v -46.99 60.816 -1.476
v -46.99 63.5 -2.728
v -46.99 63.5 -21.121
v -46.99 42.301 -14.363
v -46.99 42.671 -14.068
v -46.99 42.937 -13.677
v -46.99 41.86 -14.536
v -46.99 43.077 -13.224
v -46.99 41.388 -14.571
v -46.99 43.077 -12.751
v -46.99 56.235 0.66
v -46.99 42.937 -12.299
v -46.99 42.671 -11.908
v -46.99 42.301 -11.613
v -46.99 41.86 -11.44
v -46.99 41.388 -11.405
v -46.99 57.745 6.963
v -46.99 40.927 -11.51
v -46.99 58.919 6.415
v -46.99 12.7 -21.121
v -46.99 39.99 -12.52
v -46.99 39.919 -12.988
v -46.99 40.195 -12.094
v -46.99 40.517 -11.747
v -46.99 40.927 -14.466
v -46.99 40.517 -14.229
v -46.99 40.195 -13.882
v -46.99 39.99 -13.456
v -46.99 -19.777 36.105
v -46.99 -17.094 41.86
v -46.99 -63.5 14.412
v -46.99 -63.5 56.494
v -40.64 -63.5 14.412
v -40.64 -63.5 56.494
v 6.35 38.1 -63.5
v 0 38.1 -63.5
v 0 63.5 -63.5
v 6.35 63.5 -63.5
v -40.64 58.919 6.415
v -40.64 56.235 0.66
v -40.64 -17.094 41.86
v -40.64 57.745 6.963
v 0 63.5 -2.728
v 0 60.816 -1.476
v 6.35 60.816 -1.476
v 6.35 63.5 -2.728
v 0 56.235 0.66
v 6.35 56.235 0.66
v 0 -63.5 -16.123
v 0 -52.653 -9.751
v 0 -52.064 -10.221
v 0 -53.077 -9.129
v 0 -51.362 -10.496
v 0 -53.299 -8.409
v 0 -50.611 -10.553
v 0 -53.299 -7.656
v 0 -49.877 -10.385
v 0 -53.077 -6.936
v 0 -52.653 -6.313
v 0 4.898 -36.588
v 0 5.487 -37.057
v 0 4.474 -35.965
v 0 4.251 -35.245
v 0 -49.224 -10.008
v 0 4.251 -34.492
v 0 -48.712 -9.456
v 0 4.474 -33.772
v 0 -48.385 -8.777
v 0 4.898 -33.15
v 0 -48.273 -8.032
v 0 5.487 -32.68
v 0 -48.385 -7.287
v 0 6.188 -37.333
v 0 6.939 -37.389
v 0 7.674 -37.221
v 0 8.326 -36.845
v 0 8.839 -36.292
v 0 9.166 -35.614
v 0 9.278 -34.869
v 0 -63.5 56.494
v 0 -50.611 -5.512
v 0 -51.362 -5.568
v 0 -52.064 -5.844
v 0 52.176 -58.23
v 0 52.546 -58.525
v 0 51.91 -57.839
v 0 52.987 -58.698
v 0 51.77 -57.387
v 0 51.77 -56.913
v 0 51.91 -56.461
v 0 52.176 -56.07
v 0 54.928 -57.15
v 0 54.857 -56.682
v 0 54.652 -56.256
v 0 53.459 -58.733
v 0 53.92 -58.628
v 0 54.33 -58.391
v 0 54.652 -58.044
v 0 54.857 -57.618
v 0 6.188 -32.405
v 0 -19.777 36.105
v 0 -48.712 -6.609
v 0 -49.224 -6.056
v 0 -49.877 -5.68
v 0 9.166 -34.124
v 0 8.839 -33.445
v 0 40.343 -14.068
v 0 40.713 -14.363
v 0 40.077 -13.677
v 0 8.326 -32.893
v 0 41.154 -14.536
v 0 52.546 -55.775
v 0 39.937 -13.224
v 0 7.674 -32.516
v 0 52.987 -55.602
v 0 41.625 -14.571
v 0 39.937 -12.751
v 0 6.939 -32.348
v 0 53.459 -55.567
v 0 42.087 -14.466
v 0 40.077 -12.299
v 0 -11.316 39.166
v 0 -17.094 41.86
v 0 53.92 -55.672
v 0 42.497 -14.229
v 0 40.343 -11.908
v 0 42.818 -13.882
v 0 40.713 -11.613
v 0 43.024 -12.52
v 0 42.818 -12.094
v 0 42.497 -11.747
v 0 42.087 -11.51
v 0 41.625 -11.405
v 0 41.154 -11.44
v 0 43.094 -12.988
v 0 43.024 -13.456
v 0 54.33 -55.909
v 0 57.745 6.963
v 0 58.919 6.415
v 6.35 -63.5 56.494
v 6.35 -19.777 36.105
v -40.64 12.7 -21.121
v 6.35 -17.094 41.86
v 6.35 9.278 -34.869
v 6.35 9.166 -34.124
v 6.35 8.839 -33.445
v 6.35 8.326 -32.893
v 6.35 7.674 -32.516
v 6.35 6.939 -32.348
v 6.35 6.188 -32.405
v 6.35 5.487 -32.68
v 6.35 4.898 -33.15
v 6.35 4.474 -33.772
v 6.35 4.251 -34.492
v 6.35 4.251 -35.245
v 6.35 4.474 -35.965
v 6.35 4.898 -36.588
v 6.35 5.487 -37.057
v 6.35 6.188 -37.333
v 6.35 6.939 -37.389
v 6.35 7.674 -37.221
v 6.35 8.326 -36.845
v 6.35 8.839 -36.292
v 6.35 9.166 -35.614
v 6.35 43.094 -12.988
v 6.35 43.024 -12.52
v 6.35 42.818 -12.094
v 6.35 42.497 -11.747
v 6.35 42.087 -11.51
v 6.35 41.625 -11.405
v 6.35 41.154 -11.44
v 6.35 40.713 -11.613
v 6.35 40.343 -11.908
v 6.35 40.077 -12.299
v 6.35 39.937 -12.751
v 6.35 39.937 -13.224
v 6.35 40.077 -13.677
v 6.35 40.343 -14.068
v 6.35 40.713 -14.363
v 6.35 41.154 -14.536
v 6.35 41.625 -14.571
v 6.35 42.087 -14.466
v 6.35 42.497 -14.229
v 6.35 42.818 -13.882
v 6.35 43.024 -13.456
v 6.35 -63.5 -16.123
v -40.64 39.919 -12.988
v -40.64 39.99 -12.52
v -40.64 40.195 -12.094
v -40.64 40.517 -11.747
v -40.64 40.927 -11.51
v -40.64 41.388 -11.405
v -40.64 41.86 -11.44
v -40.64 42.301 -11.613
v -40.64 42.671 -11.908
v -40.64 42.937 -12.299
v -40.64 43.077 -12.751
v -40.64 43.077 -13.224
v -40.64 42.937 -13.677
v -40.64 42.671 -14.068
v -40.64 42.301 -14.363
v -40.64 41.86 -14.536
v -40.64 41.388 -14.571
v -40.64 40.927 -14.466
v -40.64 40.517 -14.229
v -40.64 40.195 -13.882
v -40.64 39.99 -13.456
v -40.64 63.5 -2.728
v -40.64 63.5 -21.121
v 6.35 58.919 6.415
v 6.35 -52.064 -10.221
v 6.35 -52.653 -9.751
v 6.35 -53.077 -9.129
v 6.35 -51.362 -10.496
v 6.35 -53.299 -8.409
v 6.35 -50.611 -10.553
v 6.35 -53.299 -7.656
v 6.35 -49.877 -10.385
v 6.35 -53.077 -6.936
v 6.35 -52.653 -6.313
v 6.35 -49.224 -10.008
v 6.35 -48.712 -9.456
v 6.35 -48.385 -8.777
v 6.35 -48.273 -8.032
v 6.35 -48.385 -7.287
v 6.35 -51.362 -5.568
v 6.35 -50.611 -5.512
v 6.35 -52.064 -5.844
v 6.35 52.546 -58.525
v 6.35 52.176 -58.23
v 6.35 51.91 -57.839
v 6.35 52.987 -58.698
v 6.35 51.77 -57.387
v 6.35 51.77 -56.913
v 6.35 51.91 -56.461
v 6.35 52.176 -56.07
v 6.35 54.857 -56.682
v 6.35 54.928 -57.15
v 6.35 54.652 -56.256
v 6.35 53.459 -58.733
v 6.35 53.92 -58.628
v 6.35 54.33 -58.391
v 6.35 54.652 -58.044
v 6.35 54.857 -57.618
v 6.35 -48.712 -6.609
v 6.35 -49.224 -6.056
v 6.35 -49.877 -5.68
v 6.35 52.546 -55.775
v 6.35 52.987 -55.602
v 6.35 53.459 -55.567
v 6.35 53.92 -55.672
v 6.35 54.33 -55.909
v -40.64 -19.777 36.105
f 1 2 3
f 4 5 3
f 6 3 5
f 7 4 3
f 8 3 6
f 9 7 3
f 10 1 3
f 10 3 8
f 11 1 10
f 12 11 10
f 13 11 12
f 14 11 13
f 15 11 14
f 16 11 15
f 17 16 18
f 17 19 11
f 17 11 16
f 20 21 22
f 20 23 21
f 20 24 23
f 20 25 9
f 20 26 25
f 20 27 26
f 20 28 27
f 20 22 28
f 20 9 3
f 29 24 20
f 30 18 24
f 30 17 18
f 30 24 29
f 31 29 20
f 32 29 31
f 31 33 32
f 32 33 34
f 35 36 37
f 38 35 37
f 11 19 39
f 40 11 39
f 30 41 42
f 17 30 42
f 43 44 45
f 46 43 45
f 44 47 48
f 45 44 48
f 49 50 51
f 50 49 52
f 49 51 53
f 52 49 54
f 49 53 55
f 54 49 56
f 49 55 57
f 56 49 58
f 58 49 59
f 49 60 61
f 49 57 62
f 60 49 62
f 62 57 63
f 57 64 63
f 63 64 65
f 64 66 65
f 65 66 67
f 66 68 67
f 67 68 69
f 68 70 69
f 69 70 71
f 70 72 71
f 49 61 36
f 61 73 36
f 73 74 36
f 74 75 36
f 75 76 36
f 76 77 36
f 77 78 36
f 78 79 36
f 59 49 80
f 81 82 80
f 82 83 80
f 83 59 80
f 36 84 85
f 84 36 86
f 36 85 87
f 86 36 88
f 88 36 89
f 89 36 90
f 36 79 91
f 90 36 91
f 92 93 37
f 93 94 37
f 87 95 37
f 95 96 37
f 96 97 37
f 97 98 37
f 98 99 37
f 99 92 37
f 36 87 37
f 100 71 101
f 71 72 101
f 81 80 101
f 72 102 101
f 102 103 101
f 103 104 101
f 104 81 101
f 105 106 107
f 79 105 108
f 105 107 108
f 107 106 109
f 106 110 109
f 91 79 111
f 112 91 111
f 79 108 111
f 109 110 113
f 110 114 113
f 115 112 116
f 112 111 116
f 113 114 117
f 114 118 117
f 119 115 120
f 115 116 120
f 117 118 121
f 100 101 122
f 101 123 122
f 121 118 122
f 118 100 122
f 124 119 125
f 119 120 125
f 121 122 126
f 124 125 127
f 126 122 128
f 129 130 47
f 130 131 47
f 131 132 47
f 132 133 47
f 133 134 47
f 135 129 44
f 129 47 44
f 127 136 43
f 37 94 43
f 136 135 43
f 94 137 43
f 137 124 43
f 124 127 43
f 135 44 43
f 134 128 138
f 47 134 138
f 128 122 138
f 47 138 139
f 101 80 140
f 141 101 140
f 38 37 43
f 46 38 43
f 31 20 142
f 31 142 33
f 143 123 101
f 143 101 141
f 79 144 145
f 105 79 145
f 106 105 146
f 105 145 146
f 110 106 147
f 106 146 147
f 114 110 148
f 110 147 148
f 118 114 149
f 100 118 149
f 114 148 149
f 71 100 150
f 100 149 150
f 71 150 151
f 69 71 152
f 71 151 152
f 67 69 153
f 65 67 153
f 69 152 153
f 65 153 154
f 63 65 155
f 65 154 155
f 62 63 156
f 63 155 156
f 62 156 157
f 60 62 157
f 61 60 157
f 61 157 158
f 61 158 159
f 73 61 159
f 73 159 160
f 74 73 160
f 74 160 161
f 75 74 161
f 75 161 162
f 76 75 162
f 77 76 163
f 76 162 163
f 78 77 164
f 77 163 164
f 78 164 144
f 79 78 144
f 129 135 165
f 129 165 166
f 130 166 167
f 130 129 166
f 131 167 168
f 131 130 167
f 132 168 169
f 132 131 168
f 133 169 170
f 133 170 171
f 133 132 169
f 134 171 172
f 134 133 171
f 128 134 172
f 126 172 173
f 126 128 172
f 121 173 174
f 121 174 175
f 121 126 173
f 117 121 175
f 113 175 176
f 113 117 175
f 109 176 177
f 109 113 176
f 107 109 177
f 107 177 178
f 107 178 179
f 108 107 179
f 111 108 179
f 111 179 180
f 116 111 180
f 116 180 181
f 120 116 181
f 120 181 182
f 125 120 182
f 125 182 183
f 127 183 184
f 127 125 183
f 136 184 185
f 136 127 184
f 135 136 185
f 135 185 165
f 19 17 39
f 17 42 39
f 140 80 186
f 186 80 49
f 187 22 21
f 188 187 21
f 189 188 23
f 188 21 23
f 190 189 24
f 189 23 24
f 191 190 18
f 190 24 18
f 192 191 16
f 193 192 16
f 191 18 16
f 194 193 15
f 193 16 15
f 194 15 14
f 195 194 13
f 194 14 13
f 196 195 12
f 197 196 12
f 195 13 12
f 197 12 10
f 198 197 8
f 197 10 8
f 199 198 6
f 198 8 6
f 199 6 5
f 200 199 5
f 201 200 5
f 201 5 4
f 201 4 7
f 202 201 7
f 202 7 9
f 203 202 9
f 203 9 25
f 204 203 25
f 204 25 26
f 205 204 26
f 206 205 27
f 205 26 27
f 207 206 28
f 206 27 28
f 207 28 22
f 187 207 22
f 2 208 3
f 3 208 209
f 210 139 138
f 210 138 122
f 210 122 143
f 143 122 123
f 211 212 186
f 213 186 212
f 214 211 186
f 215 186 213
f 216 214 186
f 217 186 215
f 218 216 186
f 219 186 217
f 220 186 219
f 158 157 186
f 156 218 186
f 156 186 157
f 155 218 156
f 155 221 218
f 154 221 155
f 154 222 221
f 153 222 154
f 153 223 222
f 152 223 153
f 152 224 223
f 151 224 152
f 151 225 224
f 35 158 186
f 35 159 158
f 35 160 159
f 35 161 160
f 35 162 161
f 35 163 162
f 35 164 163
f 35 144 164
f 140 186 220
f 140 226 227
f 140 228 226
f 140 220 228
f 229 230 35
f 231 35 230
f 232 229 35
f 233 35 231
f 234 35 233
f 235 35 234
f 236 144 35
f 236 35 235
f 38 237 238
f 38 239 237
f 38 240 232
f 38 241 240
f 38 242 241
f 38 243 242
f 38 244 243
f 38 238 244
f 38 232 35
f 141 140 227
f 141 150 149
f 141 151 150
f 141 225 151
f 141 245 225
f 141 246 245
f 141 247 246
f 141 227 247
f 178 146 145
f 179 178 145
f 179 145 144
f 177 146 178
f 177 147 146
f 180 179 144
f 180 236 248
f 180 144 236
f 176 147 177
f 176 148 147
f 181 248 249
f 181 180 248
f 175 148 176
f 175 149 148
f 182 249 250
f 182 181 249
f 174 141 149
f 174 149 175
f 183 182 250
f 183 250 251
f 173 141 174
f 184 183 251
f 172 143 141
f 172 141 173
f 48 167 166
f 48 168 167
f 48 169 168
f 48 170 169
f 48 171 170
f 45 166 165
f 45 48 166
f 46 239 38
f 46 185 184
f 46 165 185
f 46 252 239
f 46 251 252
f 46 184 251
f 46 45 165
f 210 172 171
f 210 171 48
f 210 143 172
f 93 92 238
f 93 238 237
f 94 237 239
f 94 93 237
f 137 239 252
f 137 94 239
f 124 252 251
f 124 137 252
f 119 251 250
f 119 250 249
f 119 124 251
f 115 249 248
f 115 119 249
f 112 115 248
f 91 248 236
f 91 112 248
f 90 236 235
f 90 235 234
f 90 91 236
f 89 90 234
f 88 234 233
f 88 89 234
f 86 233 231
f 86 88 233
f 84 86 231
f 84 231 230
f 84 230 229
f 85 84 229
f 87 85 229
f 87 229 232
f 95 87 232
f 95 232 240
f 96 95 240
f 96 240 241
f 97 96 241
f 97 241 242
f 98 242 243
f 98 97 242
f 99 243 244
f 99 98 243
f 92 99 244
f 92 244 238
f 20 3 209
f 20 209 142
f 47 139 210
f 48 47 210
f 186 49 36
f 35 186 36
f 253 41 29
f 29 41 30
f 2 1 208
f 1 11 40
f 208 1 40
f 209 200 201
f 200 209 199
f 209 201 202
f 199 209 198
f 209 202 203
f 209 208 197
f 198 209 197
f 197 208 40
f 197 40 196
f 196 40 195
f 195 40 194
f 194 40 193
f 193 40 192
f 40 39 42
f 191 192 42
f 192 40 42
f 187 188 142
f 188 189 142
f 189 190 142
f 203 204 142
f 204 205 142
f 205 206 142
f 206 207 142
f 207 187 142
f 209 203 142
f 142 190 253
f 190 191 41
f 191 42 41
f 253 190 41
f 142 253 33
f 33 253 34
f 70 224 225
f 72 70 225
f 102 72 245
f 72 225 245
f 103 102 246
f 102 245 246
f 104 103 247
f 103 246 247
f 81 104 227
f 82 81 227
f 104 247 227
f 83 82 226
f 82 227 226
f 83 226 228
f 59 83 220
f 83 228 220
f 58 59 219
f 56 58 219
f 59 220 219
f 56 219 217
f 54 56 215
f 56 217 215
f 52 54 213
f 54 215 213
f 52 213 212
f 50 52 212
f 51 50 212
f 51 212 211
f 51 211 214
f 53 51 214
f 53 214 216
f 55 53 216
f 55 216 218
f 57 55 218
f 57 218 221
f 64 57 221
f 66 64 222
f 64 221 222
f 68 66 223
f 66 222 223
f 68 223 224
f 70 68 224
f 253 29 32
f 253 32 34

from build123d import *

# Parameters (mm, degrees)
F0_R       = 1.5875
F1_DEPTH   = 6.35
F3_DEPTH   = 46.99
F4_R       = 1.5875
F5_DEPTH   = 6.35
F6_W       = 3.81
F6_H       = 76.2
F7_DEPTH   = 6.35
F8_R       = 2.5273
F9_DEPTH   = 6.35
F10_W      = 6.35
F10_H      = 5.0546
F10_H_2    = 51.2035957082
F11_DEPTH  = 6.35
F11_FACE_W = 6.35
F11_FACE_H = 6.35
F12_DEPTH  = 28.6456124865


with BuildPart() as f1:
    # F0 (on Right) → F1 (new body)
    with BuildSketch(Plane.YZ):
        Polygon((63.5, -63.5), (63.5, 4.2789274143), (-63.5, 63.5), (-63.5, -16.1231419315), (38.1, -63.5), align=None)
        with Locations((53.34, -57.15)):
            Circle(F0_R, mode=Mode.SUBTRACT)
        with Locations((41.5067932579, -12.9878712221)):
            Circle(F0_R, mode=Mode.SUBTRACT)
    extrude(amount=F1_DEPTH)

    # F8 (on face) → F9 (cut, through all)
    with BuildSketch(Plane.YZ.offset(6.35)):
        with Locations((-50.8, -8.0323496192)):
            Circle(F8_R)
        with Locations((6.7505444768, -34.8686092397)):
            Circle(F8_R)
    extrude(amount=-F9_DEPTH, mode=Mode.SUBTRACT)


with BuildPart() as f3:
    # F2 (on face) → F3 (new body)
    with BuildSketch(Plane(origin=(0, 0, 0), x_dir=(0, -1, 0), z_dir=(-1, 0, 0))):
        Polygon((11.7045099709, 32.3409165561), (63.5, 56.4935502146), (63.5, 63.5), (9.0208840088, 38.0959710038), align=None)
        Polygon((-63.5, -2.7275223711), (-55.0613195903, 1.2074989287), (-57.7449455523, 6.9625533764), (-63.5, 4.2789274143), align=None)
        Polygon((-55.0613195903, 1.2074989287), (11.7045099709, 32.3409165561), (9.0208840088, 38.0959710038), (-57.7449455523, 6.9625533764), align=None)
    extrude(amount=F3_DEPTH)

    # F4 (on face) → F5 (join)
    with BuildSketch(Plane(origin=(-46.99, 0, 0), x_dir=(0, -1, 0), z_dir=(-1, 0, 0))):
        Polygon((63.5, 63.5), (-63.5, 4.2789274143), (-63.5, -21.1210725857), (-12.7, -21.1210725857), (63.5, 14.4115709657), align=None)
        with Locations((-41.5067932579, -12.9878712221)):
            Circle(F4_R, mode=Mode.SUBTRACT)
    extrude(amount=-F5_DEPTH)

    # F6 (on face) → F7 (cut, through all)
    with BuildSketch(Plane(origin=(0, 12.9804176766, 27.8365955385), x_dir=(1, 0, 0), z_dir=(0, 0.4226182617, 0.906307787))):
        with Locations((-1.905, 11.2921916109)):
            Rectangle(F6_W, F6_H)
        with Locations((-38.735, 11.2921916109)):
            Rectangle(F6_W, F6_H)
    extrude(amount=-F7_DEPTH, mode=Mode.SUBTRACT)


with BuildPart() as f11_tool:
    # F10 (on face) → F11 (new body)
    with BuildSketch(Plane(origin=(0, 12.9804176766, 27.8365955385), x_dir=(1, 0, 0), z_dir=(0, 0.4226182617, 0.906307787))):
        Polygon((-3.81, 49.3921916109), (0, 49.3921916109), (0, 50.6875916109), (0, 55.7421916109), (-46.99, 55.7421916109), (-46.99, 50.6875916109), (-40.64, 50.6875916109), (-40.64, 49.3921916109), (-36.83, 49.3921916109), (-36.83, -26.8078083891), (-40.64, -26.8078083891), (-40.64, -33.1832083891), (-46.99, -33.1832083891), (-46.99, -84.3868040974), (0, -84.3868040974), (0, -33.1832083891), (0, -26.8078083891), (-3.81, -26.8078083891), align=None)
        with Locations((3.175, 53.2148916109)):
            Rectangle(F10_W, F10_H)
        with Locations((3.175, -58.7850062432)):
            Rectangle(F10_W, F10_H_2)
    extrude(amount=-F11_DEPTH)


with BuildPart() as f1_1:
    add(f1.part)

    # F11: cut by f11_tool
    add(f11_tool.part, mode=Mode.SUBTRACT)


with BuildPart() as f3_1:
    add(f3.part)

    # F11: cut by f11_tool
    add(f11_tool.part, mode=Mode.SUBTRACT)


with BuildPart() as f12_tool:
    # F11_face (on face) + F11_face1 (on face) → F12 (new body, through all)
    with BuildSketch(Plane(origin=(3.175, 62.158187019, 1.4014001905), x_dir=(1, 0, 0), z_dir=(0, -0.906307787, 0.4226182617))):
        Rectangle(F11_FACE_W, F11_FACE_H)
    with BuildSketch(Plane(origin=(-23.495, 62.158187019, 1.4014001905), x_dir=(1, 0, 0), z_dir=(0, -0.906307787, 0.4226182617))):
        Polygon((23.495, 3.175), (-23.495, 3.175), (-23.495, -3.175), (-17.145, -3.175), (23.495, -3.175), align=None)
    extrude(amount=-F12_DEPTH)


with BuildPart() as f1_2:
    add(f1_1.part)

    # F12: cut by f12_tool
    add(f12_tool.part, mode=Mode.SUBTRACT)


with BuildPart() as f3_2:
    add(f3_1.part)

    # F12: cut by f12_tool
    add(f12_tool.part, mode=Mode.SUBTRACT)


solid = Compound([f1_2.part, f3_2.part])
